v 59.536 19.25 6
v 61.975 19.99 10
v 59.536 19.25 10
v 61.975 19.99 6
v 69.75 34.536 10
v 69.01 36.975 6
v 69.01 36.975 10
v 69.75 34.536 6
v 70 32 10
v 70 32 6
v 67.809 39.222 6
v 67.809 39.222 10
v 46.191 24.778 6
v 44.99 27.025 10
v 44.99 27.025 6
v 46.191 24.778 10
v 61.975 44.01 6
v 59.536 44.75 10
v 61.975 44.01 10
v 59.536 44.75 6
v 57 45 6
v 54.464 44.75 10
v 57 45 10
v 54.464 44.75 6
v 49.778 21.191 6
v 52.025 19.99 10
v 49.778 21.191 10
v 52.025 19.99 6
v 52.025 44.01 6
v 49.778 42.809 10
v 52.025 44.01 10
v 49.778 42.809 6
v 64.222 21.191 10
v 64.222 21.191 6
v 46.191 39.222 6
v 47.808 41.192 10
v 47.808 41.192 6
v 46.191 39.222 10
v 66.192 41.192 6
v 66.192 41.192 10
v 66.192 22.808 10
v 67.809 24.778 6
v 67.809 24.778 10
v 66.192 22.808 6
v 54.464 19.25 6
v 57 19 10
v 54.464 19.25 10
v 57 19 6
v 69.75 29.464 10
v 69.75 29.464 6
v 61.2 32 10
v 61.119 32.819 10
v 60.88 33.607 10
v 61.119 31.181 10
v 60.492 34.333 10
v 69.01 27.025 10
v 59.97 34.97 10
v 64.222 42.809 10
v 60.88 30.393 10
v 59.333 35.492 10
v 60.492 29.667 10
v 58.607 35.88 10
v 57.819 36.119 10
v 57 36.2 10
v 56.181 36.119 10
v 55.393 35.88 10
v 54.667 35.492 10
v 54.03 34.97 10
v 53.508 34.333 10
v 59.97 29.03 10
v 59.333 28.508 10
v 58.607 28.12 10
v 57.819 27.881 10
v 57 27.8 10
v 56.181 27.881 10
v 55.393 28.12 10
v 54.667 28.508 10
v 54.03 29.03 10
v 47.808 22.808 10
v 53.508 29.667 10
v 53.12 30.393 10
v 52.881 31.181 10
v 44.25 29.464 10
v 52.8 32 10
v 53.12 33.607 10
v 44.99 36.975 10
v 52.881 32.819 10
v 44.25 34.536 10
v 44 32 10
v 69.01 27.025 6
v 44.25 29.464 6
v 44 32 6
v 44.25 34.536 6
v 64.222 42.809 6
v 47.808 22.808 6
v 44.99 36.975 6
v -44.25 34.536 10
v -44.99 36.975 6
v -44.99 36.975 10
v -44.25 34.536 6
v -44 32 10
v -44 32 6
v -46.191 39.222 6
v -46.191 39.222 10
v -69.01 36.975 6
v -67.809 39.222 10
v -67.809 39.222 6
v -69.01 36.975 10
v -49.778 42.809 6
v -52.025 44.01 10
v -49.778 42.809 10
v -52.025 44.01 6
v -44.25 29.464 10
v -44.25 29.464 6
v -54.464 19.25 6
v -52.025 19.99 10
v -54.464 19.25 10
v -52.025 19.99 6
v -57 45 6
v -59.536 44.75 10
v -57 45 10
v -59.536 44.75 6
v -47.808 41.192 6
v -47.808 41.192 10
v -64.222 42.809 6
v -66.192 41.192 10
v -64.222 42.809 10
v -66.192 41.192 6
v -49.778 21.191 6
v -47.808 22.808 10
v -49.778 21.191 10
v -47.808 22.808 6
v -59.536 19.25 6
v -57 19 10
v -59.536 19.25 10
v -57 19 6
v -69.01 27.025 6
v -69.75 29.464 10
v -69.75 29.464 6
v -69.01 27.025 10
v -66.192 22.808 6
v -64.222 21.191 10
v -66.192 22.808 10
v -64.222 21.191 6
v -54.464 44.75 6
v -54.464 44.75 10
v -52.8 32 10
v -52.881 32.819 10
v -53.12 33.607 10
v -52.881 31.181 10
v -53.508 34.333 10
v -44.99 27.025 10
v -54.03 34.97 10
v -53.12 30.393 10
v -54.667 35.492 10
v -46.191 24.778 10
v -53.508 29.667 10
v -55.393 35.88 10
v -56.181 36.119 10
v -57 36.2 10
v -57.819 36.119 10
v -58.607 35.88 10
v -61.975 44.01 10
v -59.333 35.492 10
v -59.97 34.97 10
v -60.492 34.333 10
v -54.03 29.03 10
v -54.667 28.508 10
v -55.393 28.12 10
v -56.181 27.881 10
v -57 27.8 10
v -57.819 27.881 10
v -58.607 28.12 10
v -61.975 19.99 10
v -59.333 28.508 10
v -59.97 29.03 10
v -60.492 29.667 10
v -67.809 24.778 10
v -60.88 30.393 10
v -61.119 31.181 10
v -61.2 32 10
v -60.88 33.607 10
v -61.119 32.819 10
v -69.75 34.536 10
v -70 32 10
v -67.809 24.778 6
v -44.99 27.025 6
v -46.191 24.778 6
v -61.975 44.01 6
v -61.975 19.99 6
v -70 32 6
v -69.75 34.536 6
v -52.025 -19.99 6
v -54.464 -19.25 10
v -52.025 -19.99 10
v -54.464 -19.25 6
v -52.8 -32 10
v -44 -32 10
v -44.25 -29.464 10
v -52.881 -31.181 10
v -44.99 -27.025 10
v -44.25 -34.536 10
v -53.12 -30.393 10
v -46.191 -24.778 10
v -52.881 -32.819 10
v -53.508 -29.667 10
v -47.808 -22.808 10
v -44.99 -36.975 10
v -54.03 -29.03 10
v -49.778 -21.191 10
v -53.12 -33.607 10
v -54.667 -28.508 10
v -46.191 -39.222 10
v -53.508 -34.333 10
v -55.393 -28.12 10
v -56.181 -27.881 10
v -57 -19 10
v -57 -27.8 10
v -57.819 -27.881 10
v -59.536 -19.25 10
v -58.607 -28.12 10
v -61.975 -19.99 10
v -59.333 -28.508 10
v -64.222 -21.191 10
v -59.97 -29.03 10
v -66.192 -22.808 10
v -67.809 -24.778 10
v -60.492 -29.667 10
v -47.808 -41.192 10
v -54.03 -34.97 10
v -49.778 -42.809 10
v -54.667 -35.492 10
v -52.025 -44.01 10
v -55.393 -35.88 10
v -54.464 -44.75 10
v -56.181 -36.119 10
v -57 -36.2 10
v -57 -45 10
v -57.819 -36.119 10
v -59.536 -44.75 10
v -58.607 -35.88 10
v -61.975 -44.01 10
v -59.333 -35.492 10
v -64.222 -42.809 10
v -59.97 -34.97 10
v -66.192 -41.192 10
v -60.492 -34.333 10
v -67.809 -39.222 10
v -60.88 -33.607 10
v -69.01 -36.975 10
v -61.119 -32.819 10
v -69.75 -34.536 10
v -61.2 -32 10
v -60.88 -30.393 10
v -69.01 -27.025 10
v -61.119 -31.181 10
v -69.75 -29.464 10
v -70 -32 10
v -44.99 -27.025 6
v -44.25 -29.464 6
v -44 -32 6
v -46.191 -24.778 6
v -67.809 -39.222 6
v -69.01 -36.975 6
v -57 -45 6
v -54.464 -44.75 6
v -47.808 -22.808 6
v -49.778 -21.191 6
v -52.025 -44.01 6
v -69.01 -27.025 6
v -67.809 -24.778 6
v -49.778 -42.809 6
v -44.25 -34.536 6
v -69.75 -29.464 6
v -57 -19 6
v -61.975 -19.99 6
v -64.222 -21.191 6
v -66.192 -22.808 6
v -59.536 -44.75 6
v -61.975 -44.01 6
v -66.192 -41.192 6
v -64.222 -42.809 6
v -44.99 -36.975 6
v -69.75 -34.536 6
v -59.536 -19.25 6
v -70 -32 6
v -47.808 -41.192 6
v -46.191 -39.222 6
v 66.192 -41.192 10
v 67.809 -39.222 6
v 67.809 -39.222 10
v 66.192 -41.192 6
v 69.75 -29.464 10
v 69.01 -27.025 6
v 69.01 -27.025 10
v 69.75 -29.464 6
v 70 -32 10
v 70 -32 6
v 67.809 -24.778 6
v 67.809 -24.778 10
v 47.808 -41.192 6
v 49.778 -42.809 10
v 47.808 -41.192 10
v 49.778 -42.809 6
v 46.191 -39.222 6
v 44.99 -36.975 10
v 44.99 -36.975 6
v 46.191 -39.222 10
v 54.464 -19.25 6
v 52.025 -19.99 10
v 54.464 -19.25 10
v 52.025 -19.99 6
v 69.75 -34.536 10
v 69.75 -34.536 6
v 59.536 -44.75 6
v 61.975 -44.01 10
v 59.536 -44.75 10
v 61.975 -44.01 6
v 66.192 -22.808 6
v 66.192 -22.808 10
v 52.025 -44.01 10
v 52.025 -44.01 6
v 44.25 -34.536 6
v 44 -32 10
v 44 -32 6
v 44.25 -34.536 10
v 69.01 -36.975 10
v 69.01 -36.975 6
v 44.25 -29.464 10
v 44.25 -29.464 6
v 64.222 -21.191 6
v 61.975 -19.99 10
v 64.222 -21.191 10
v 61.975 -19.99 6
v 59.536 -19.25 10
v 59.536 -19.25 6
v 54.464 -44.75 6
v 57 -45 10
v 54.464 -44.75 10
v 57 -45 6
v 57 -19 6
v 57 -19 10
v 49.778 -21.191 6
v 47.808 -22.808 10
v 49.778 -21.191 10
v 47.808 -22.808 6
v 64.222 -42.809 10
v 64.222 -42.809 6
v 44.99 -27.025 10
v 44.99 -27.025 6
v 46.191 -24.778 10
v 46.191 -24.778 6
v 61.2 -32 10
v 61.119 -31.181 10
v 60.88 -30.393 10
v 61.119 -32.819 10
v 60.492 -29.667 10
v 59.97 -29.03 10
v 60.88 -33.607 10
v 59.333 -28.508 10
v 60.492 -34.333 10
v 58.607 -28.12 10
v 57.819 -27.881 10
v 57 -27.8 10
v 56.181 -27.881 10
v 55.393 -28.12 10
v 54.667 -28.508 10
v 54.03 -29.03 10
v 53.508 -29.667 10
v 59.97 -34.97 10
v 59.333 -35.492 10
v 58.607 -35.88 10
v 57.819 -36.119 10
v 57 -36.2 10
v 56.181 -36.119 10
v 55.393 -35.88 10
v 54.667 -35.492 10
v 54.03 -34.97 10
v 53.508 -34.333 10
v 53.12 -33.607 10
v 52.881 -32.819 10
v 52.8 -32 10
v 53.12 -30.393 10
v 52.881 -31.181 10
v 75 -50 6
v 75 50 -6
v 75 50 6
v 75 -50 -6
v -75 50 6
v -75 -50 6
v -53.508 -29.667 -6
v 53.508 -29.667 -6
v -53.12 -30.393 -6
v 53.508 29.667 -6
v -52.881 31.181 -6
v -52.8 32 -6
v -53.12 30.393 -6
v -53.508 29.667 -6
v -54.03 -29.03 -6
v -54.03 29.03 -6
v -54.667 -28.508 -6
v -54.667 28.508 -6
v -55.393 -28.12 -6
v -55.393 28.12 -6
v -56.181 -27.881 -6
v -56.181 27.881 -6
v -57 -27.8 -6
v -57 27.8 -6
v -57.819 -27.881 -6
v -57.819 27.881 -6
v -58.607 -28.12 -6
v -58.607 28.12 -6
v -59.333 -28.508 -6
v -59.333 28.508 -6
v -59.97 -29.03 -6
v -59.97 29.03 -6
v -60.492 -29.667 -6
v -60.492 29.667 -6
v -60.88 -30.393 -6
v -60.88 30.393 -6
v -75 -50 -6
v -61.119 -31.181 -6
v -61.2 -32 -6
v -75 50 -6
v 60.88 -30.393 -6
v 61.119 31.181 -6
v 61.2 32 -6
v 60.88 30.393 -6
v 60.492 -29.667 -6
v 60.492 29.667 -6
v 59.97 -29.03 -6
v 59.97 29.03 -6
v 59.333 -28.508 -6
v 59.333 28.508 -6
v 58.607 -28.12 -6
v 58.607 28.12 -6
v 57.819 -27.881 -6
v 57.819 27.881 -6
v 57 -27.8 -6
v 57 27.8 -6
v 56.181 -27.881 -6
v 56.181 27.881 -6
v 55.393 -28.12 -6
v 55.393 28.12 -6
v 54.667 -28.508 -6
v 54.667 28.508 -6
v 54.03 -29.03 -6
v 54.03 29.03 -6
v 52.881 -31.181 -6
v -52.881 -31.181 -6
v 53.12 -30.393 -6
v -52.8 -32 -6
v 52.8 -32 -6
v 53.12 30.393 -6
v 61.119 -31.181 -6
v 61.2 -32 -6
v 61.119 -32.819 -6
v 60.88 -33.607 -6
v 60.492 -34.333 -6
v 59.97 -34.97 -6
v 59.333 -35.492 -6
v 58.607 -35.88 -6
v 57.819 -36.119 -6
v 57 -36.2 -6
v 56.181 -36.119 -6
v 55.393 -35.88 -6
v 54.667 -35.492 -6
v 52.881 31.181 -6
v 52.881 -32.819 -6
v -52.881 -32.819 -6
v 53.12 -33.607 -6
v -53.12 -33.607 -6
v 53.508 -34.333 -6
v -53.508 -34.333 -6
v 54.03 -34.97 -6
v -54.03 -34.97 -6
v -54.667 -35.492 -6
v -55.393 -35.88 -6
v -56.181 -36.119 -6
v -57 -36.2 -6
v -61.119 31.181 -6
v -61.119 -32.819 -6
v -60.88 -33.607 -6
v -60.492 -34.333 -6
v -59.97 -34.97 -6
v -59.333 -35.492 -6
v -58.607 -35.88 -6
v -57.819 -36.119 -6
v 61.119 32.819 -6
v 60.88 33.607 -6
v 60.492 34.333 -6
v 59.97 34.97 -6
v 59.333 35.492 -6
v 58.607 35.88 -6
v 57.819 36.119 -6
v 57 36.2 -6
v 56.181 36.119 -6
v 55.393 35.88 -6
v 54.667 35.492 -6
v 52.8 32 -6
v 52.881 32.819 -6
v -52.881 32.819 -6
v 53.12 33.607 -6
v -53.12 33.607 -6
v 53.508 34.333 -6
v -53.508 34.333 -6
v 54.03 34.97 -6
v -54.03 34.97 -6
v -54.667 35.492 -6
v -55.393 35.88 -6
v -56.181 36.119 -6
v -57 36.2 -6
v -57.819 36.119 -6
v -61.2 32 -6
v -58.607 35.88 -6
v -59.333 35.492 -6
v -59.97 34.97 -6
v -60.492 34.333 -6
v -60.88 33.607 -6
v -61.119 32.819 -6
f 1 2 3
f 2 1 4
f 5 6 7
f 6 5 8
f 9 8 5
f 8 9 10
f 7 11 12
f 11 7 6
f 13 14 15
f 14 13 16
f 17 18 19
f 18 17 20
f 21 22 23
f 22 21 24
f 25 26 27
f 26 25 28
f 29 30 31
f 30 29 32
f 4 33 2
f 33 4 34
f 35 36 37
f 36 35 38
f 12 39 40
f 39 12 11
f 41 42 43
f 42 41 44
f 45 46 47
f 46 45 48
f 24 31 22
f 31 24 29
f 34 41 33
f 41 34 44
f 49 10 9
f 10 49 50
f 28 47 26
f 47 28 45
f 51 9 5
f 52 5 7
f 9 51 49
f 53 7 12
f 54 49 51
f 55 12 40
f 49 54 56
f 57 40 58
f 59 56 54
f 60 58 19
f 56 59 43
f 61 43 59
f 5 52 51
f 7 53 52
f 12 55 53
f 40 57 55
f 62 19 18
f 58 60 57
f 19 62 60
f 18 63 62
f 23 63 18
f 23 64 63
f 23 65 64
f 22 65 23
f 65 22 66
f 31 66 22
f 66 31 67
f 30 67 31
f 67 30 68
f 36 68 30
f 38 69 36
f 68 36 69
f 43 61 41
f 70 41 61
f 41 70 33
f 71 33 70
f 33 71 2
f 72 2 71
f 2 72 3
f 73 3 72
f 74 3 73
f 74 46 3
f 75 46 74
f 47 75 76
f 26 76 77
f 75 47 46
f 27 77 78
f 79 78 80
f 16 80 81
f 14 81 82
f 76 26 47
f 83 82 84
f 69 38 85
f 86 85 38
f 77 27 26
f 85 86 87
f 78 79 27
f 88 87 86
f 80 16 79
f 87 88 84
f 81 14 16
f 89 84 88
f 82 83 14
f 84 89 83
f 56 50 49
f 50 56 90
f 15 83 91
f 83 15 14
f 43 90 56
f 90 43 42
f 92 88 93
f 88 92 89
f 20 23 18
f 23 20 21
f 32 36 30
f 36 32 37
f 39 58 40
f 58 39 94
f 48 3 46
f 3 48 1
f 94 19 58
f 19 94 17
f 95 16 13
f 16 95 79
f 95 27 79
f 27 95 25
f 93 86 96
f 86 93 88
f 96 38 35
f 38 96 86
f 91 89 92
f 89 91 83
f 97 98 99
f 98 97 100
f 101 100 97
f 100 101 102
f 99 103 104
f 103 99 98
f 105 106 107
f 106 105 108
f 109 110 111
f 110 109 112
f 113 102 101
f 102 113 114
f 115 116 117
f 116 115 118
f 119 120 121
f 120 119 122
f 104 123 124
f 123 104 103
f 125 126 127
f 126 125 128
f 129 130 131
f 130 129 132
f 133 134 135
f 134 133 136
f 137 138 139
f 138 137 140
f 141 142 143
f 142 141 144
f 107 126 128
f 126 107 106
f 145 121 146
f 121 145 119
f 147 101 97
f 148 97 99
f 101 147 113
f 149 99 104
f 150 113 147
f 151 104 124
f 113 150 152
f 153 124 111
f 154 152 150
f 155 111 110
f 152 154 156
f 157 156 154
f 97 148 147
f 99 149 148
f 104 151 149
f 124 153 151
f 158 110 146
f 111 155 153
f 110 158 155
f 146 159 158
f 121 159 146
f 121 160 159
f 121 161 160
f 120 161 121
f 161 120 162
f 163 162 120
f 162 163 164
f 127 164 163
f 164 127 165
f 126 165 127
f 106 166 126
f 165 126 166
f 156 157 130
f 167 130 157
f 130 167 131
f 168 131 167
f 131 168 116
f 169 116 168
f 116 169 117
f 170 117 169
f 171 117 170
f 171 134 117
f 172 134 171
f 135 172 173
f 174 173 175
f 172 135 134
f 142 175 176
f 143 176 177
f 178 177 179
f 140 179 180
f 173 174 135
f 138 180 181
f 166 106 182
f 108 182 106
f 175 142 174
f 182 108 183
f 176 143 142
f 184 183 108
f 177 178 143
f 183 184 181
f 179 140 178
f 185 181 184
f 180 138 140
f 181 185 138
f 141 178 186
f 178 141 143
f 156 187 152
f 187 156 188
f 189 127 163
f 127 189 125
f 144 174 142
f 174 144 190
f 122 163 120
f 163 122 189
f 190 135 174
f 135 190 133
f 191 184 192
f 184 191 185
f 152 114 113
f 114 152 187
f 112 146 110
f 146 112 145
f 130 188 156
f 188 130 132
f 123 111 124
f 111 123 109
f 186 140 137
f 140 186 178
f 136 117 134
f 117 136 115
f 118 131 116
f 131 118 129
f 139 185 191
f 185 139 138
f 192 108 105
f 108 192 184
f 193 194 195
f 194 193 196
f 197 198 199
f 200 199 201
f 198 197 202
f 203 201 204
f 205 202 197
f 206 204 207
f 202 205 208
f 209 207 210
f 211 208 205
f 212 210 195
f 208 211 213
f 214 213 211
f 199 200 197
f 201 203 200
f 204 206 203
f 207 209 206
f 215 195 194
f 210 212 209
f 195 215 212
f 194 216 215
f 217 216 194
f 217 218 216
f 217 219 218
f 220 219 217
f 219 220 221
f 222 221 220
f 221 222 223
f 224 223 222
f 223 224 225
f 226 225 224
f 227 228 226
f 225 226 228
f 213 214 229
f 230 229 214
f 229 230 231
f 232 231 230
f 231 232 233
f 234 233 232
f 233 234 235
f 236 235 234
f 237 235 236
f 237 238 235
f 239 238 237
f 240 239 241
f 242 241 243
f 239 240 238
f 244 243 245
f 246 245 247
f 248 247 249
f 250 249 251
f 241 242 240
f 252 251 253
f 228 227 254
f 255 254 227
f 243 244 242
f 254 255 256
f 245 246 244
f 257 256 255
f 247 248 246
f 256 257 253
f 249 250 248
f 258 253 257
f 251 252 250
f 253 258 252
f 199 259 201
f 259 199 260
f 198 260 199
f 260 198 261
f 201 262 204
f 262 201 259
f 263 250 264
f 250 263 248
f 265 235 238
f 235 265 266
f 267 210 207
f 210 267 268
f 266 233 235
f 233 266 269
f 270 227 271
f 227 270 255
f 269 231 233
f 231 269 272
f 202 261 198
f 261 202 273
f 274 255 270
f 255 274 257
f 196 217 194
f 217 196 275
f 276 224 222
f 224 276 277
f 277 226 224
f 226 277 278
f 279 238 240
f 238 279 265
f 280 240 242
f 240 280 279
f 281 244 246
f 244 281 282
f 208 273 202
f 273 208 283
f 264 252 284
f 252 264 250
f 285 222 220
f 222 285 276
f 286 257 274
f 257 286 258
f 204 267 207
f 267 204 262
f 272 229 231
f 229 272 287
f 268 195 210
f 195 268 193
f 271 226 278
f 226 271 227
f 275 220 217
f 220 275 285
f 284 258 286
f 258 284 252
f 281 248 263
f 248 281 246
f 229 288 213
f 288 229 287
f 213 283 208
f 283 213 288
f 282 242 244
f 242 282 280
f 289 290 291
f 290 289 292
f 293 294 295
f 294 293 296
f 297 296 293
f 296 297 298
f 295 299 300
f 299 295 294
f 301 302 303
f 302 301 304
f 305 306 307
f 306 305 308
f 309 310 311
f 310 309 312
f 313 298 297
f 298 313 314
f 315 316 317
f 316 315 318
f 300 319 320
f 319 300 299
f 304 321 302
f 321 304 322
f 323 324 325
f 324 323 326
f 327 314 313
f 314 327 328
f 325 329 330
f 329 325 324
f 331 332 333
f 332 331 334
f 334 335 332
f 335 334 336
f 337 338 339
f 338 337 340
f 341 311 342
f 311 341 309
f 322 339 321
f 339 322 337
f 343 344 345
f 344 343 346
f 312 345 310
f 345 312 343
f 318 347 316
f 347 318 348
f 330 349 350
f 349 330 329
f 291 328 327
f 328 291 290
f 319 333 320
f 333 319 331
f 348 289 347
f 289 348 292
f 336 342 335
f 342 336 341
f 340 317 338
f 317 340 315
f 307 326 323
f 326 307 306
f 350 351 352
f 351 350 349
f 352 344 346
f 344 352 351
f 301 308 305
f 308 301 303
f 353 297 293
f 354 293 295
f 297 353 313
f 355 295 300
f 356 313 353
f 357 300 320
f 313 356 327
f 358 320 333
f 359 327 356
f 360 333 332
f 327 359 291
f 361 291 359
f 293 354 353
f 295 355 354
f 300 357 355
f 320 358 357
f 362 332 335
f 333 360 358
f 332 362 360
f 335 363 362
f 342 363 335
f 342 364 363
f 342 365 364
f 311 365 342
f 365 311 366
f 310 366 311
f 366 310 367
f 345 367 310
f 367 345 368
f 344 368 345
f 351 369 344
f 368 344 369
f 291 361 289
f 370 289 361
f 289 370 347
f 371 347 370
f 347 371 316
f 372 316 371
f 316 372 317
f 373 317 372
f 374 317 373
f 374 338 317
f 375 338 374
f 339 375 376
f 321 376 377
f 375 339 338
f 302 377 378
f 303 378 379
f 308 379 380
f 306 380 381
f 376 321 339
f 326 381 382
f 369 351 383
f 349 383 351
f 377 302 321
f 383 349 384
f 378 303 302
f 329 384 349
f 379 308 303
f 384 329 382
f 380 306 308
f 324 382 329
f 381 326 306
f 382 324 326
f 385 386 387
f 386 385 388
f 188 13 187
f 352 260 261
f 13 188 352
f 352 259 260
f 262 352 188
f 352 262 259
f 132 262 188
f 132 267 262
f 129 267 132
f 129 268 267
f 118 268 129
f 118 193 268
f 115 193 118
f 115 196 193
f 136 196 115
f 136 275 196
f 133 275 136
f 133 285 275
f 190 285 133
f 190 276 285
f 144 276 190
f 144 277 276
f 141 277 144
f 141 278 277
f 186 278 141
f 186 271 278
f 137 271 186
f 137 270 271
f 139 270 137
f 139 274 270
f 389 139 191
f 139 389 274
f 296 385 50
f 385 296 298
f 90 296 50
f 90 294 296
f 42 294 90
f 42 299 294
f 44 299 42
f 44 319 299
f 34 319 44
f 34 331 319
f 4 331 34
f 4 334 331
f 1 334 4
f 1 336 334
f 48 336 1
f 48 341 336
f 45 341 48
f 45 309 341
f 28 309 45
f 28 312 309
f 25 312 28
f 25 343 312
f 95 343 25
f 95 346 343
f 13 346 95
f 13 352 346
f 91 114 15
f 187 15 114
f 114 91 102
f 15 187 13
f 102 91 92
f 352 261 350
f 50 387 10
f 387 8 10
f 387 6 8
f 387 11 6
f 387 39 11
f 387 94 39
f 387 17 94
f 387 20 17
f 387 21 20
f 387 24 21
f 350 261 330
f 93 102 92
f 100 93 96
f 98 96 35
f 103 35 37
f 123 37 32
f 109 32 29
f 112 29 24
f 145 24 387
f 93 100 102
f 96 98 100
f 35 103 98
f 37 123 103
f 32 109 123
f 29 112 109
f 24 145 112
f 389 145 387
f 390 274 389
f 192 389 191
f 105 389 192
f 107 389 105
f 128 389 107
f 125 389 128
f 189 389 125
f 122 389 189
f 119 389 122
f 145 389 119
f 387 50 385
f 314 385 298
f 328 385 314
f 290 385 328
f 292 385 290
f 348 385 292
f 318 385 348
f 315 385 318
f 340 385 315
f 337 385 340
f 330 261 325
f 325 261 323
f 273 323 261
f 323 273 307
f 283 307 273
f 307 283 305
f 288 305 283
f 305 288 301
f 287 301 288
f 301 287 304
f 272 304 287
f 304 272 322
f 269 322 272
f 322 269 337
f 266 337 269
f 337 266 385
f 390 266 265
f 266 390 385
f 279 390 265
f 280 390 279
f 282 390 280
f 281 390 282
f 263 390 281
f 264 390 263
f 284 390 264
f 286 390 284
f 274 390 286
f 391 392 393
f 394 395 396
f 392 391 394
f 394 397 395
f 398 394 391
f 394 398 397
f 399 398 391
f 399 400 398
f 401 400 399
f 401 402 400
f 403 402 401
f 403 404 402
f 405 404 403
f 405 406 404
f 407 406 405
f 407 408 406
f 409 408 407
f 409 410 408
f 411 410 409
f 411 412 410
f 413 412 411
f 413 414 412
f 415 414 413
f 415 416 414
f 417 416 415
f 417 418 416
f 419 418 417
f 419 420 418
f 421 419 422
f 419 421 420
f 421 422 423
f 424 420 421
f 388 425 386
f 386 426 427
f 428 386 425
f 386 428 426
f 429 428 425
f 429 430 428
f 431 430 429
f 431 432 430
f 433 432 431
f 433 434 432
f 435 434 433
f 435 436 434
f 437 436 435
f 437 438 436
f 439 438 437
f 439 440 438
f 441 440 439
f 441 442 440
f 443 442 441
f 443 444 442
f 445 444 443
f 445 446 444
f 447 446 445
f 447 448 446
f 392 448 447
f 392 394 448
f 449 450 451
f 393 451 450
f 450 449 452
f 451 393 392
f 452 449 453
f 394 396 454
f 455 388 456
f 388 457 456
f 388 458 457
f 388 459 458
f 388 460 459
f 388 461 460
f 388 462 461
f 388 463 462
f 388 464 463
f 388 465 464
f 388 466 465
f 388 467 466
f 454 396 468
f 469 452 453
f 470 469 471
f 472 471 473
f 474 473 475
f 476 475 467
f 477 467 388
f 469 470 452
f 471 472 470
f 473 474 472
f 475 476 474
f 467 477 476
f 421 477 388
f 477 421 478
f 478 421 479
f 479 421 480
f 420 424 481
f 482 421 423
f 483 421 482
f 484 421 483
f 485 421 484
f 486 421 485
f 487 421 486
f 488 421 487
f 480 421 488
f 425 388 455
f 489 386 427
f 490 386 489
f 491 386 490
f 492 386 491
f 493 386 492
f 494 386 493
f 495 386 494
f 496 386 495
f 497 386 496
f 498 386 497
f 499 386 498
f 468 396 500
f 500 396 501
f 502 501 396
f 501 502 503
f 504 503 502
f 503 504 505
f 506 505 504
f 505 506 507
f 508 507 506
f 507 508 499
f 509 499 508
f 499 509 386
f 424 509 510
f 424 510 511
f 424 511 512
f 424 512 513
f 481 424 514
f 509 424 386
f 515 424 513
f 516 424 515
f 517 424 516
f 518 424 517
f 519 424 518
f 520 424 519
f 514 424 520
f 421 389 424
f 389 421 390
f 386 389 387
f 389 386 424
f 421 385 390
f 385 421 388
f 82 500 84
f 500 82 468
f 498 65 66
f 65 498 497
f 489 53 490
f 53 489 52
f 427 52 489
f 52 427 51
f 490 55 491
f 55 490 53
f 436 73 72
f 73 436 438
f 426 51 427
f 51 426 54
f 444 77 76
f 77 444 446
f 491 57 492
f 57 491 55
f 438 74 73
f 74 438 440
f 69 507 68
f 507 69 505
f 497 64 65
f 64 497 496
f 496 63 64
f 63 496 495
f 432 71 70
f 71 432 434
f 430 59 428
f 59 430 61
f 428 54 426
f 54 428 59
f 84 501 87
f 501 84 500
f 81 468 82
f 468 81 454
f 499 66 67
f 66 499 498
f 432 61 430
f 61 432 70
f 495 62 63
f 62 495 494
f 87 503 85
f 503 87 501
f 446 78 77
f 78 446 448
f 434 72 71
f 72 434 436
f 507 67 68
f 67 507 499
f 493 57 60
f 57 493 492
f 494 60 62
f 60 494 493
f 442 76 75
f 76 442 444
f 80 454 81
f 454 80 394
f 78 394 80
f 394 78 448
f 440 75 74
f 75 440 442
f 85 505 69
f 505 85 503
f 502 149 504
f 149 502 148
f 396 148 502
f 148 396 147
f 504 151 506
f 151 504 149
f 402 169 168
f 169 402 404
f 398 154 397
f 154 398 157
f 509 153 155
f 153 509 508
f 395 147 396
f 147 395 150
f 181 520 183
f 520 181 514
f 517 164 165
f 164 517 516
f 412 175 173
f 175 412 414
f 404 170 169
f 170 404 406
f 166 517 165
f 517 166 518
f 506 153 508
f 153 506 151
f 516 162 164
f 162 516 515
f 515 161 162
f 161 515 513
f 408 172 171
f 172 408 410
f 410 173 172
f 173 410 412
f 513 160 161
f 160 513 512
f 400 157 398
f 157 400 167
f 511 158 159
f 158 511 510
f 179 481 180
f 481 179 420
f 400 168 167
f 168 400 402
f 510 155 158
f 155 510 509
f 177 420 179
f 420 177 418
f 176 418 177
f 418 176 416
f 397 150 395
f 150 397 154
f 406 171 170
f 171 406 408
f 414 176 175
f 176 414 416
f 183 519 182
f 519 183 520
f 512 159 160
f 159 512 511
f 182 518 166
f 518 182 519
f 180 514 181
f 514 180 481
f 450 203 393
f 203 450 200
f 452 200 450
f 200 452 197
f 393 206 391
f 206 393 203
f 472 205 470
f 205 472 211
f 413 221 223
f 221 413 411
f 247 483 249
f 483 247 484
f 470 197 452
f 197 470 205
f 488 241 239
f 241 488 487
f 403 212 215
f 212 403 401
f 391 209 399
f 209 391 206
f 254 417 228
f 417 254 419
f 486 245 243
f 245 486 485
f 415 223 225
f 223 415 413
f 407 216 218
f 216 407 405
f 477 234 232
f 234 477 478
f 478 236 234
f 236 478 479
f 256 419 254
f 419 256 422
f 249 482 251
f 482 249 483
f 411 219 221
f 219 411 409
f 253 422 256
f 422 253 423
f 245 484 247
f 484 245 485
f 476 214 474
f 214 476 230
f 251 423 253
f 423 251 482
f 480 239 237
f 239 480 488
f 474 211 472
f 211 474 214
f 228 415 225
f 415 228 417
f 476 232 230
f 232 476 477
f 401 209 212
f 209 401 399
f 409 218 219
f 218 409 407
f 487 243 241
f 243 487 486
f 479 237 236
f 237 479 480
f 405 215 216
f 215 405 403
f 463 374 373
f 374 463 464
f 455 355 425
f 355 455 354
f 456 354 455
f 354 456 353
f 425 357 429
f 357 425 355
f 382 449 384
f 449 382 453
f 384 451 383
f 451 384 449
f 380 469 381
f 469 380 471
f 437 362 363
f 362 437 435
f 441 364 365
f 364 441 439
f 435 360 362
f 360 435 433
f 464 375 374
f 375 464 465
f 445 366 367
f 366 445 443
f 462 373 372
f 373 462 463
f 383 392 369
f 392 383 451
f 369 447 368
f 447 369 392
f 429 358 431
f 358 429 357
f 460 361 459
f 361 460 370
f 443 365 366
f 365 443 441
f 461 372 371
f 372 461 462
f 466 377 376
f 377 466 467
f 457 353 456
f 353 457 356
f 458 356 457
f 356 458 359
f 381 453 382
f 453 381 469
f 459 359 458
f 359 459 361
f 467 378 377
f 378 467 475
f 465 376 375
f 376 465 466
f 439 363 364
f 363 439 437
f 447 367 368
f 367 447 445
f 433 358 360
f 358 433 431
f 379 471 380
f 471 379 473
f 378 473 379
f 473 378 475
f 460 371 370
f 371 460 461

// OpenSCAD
$fn = 32;

// ----------------------------------------------------------------------
// Anchor pads 150 x 100 x 16
// four corner bosses with anchor holes
// ----------------------------------------------------------------------

// --- parameters (mm) ---
plate = [150, 100, 12];  // base plate size (x, y, z)
pads = 4;                // boss count, one per corner
edge = 18;               // boss centre offset from the plate edge
boss_d = 26;             // boss diameter
boss_h = 4;              // boss height above the base plate
hole_d = 8.4;            // hole diameter

// --- derived feature positions (mm) ---
height = plate[2] + boss_h;      // = 16   overall height of the part
corner_x = plate[0] / 2 - edge;  // = 57   boss centre X
corner_y = plate[1] / 2 - edge;  // = 32   boss centre Y
feature_centers = [
  [corner_x, corner_y],
  [-corner_x, corner_y],
  [-corner_x, -corner_y],
  [corner_x, -corner_y]
];   // boss centres, anchor holes are drilled there

// base plate, four bosses standing on it, anchor holes all the way through
difference() {
  union() {
    cube(plate, center = true);
    for (centre = feature_centers)
      translate([centre[0], centre[1], plate[2] / 2 - 1])
        cylinder(d = boss_d, h = boss_h + 1);
  }
  for (centre = feature_centers)
    translate([centre[0], centre[1], -height])
      cylinder(d = hole_d, h = 2 * height + 2);  // through boss and plate
}
